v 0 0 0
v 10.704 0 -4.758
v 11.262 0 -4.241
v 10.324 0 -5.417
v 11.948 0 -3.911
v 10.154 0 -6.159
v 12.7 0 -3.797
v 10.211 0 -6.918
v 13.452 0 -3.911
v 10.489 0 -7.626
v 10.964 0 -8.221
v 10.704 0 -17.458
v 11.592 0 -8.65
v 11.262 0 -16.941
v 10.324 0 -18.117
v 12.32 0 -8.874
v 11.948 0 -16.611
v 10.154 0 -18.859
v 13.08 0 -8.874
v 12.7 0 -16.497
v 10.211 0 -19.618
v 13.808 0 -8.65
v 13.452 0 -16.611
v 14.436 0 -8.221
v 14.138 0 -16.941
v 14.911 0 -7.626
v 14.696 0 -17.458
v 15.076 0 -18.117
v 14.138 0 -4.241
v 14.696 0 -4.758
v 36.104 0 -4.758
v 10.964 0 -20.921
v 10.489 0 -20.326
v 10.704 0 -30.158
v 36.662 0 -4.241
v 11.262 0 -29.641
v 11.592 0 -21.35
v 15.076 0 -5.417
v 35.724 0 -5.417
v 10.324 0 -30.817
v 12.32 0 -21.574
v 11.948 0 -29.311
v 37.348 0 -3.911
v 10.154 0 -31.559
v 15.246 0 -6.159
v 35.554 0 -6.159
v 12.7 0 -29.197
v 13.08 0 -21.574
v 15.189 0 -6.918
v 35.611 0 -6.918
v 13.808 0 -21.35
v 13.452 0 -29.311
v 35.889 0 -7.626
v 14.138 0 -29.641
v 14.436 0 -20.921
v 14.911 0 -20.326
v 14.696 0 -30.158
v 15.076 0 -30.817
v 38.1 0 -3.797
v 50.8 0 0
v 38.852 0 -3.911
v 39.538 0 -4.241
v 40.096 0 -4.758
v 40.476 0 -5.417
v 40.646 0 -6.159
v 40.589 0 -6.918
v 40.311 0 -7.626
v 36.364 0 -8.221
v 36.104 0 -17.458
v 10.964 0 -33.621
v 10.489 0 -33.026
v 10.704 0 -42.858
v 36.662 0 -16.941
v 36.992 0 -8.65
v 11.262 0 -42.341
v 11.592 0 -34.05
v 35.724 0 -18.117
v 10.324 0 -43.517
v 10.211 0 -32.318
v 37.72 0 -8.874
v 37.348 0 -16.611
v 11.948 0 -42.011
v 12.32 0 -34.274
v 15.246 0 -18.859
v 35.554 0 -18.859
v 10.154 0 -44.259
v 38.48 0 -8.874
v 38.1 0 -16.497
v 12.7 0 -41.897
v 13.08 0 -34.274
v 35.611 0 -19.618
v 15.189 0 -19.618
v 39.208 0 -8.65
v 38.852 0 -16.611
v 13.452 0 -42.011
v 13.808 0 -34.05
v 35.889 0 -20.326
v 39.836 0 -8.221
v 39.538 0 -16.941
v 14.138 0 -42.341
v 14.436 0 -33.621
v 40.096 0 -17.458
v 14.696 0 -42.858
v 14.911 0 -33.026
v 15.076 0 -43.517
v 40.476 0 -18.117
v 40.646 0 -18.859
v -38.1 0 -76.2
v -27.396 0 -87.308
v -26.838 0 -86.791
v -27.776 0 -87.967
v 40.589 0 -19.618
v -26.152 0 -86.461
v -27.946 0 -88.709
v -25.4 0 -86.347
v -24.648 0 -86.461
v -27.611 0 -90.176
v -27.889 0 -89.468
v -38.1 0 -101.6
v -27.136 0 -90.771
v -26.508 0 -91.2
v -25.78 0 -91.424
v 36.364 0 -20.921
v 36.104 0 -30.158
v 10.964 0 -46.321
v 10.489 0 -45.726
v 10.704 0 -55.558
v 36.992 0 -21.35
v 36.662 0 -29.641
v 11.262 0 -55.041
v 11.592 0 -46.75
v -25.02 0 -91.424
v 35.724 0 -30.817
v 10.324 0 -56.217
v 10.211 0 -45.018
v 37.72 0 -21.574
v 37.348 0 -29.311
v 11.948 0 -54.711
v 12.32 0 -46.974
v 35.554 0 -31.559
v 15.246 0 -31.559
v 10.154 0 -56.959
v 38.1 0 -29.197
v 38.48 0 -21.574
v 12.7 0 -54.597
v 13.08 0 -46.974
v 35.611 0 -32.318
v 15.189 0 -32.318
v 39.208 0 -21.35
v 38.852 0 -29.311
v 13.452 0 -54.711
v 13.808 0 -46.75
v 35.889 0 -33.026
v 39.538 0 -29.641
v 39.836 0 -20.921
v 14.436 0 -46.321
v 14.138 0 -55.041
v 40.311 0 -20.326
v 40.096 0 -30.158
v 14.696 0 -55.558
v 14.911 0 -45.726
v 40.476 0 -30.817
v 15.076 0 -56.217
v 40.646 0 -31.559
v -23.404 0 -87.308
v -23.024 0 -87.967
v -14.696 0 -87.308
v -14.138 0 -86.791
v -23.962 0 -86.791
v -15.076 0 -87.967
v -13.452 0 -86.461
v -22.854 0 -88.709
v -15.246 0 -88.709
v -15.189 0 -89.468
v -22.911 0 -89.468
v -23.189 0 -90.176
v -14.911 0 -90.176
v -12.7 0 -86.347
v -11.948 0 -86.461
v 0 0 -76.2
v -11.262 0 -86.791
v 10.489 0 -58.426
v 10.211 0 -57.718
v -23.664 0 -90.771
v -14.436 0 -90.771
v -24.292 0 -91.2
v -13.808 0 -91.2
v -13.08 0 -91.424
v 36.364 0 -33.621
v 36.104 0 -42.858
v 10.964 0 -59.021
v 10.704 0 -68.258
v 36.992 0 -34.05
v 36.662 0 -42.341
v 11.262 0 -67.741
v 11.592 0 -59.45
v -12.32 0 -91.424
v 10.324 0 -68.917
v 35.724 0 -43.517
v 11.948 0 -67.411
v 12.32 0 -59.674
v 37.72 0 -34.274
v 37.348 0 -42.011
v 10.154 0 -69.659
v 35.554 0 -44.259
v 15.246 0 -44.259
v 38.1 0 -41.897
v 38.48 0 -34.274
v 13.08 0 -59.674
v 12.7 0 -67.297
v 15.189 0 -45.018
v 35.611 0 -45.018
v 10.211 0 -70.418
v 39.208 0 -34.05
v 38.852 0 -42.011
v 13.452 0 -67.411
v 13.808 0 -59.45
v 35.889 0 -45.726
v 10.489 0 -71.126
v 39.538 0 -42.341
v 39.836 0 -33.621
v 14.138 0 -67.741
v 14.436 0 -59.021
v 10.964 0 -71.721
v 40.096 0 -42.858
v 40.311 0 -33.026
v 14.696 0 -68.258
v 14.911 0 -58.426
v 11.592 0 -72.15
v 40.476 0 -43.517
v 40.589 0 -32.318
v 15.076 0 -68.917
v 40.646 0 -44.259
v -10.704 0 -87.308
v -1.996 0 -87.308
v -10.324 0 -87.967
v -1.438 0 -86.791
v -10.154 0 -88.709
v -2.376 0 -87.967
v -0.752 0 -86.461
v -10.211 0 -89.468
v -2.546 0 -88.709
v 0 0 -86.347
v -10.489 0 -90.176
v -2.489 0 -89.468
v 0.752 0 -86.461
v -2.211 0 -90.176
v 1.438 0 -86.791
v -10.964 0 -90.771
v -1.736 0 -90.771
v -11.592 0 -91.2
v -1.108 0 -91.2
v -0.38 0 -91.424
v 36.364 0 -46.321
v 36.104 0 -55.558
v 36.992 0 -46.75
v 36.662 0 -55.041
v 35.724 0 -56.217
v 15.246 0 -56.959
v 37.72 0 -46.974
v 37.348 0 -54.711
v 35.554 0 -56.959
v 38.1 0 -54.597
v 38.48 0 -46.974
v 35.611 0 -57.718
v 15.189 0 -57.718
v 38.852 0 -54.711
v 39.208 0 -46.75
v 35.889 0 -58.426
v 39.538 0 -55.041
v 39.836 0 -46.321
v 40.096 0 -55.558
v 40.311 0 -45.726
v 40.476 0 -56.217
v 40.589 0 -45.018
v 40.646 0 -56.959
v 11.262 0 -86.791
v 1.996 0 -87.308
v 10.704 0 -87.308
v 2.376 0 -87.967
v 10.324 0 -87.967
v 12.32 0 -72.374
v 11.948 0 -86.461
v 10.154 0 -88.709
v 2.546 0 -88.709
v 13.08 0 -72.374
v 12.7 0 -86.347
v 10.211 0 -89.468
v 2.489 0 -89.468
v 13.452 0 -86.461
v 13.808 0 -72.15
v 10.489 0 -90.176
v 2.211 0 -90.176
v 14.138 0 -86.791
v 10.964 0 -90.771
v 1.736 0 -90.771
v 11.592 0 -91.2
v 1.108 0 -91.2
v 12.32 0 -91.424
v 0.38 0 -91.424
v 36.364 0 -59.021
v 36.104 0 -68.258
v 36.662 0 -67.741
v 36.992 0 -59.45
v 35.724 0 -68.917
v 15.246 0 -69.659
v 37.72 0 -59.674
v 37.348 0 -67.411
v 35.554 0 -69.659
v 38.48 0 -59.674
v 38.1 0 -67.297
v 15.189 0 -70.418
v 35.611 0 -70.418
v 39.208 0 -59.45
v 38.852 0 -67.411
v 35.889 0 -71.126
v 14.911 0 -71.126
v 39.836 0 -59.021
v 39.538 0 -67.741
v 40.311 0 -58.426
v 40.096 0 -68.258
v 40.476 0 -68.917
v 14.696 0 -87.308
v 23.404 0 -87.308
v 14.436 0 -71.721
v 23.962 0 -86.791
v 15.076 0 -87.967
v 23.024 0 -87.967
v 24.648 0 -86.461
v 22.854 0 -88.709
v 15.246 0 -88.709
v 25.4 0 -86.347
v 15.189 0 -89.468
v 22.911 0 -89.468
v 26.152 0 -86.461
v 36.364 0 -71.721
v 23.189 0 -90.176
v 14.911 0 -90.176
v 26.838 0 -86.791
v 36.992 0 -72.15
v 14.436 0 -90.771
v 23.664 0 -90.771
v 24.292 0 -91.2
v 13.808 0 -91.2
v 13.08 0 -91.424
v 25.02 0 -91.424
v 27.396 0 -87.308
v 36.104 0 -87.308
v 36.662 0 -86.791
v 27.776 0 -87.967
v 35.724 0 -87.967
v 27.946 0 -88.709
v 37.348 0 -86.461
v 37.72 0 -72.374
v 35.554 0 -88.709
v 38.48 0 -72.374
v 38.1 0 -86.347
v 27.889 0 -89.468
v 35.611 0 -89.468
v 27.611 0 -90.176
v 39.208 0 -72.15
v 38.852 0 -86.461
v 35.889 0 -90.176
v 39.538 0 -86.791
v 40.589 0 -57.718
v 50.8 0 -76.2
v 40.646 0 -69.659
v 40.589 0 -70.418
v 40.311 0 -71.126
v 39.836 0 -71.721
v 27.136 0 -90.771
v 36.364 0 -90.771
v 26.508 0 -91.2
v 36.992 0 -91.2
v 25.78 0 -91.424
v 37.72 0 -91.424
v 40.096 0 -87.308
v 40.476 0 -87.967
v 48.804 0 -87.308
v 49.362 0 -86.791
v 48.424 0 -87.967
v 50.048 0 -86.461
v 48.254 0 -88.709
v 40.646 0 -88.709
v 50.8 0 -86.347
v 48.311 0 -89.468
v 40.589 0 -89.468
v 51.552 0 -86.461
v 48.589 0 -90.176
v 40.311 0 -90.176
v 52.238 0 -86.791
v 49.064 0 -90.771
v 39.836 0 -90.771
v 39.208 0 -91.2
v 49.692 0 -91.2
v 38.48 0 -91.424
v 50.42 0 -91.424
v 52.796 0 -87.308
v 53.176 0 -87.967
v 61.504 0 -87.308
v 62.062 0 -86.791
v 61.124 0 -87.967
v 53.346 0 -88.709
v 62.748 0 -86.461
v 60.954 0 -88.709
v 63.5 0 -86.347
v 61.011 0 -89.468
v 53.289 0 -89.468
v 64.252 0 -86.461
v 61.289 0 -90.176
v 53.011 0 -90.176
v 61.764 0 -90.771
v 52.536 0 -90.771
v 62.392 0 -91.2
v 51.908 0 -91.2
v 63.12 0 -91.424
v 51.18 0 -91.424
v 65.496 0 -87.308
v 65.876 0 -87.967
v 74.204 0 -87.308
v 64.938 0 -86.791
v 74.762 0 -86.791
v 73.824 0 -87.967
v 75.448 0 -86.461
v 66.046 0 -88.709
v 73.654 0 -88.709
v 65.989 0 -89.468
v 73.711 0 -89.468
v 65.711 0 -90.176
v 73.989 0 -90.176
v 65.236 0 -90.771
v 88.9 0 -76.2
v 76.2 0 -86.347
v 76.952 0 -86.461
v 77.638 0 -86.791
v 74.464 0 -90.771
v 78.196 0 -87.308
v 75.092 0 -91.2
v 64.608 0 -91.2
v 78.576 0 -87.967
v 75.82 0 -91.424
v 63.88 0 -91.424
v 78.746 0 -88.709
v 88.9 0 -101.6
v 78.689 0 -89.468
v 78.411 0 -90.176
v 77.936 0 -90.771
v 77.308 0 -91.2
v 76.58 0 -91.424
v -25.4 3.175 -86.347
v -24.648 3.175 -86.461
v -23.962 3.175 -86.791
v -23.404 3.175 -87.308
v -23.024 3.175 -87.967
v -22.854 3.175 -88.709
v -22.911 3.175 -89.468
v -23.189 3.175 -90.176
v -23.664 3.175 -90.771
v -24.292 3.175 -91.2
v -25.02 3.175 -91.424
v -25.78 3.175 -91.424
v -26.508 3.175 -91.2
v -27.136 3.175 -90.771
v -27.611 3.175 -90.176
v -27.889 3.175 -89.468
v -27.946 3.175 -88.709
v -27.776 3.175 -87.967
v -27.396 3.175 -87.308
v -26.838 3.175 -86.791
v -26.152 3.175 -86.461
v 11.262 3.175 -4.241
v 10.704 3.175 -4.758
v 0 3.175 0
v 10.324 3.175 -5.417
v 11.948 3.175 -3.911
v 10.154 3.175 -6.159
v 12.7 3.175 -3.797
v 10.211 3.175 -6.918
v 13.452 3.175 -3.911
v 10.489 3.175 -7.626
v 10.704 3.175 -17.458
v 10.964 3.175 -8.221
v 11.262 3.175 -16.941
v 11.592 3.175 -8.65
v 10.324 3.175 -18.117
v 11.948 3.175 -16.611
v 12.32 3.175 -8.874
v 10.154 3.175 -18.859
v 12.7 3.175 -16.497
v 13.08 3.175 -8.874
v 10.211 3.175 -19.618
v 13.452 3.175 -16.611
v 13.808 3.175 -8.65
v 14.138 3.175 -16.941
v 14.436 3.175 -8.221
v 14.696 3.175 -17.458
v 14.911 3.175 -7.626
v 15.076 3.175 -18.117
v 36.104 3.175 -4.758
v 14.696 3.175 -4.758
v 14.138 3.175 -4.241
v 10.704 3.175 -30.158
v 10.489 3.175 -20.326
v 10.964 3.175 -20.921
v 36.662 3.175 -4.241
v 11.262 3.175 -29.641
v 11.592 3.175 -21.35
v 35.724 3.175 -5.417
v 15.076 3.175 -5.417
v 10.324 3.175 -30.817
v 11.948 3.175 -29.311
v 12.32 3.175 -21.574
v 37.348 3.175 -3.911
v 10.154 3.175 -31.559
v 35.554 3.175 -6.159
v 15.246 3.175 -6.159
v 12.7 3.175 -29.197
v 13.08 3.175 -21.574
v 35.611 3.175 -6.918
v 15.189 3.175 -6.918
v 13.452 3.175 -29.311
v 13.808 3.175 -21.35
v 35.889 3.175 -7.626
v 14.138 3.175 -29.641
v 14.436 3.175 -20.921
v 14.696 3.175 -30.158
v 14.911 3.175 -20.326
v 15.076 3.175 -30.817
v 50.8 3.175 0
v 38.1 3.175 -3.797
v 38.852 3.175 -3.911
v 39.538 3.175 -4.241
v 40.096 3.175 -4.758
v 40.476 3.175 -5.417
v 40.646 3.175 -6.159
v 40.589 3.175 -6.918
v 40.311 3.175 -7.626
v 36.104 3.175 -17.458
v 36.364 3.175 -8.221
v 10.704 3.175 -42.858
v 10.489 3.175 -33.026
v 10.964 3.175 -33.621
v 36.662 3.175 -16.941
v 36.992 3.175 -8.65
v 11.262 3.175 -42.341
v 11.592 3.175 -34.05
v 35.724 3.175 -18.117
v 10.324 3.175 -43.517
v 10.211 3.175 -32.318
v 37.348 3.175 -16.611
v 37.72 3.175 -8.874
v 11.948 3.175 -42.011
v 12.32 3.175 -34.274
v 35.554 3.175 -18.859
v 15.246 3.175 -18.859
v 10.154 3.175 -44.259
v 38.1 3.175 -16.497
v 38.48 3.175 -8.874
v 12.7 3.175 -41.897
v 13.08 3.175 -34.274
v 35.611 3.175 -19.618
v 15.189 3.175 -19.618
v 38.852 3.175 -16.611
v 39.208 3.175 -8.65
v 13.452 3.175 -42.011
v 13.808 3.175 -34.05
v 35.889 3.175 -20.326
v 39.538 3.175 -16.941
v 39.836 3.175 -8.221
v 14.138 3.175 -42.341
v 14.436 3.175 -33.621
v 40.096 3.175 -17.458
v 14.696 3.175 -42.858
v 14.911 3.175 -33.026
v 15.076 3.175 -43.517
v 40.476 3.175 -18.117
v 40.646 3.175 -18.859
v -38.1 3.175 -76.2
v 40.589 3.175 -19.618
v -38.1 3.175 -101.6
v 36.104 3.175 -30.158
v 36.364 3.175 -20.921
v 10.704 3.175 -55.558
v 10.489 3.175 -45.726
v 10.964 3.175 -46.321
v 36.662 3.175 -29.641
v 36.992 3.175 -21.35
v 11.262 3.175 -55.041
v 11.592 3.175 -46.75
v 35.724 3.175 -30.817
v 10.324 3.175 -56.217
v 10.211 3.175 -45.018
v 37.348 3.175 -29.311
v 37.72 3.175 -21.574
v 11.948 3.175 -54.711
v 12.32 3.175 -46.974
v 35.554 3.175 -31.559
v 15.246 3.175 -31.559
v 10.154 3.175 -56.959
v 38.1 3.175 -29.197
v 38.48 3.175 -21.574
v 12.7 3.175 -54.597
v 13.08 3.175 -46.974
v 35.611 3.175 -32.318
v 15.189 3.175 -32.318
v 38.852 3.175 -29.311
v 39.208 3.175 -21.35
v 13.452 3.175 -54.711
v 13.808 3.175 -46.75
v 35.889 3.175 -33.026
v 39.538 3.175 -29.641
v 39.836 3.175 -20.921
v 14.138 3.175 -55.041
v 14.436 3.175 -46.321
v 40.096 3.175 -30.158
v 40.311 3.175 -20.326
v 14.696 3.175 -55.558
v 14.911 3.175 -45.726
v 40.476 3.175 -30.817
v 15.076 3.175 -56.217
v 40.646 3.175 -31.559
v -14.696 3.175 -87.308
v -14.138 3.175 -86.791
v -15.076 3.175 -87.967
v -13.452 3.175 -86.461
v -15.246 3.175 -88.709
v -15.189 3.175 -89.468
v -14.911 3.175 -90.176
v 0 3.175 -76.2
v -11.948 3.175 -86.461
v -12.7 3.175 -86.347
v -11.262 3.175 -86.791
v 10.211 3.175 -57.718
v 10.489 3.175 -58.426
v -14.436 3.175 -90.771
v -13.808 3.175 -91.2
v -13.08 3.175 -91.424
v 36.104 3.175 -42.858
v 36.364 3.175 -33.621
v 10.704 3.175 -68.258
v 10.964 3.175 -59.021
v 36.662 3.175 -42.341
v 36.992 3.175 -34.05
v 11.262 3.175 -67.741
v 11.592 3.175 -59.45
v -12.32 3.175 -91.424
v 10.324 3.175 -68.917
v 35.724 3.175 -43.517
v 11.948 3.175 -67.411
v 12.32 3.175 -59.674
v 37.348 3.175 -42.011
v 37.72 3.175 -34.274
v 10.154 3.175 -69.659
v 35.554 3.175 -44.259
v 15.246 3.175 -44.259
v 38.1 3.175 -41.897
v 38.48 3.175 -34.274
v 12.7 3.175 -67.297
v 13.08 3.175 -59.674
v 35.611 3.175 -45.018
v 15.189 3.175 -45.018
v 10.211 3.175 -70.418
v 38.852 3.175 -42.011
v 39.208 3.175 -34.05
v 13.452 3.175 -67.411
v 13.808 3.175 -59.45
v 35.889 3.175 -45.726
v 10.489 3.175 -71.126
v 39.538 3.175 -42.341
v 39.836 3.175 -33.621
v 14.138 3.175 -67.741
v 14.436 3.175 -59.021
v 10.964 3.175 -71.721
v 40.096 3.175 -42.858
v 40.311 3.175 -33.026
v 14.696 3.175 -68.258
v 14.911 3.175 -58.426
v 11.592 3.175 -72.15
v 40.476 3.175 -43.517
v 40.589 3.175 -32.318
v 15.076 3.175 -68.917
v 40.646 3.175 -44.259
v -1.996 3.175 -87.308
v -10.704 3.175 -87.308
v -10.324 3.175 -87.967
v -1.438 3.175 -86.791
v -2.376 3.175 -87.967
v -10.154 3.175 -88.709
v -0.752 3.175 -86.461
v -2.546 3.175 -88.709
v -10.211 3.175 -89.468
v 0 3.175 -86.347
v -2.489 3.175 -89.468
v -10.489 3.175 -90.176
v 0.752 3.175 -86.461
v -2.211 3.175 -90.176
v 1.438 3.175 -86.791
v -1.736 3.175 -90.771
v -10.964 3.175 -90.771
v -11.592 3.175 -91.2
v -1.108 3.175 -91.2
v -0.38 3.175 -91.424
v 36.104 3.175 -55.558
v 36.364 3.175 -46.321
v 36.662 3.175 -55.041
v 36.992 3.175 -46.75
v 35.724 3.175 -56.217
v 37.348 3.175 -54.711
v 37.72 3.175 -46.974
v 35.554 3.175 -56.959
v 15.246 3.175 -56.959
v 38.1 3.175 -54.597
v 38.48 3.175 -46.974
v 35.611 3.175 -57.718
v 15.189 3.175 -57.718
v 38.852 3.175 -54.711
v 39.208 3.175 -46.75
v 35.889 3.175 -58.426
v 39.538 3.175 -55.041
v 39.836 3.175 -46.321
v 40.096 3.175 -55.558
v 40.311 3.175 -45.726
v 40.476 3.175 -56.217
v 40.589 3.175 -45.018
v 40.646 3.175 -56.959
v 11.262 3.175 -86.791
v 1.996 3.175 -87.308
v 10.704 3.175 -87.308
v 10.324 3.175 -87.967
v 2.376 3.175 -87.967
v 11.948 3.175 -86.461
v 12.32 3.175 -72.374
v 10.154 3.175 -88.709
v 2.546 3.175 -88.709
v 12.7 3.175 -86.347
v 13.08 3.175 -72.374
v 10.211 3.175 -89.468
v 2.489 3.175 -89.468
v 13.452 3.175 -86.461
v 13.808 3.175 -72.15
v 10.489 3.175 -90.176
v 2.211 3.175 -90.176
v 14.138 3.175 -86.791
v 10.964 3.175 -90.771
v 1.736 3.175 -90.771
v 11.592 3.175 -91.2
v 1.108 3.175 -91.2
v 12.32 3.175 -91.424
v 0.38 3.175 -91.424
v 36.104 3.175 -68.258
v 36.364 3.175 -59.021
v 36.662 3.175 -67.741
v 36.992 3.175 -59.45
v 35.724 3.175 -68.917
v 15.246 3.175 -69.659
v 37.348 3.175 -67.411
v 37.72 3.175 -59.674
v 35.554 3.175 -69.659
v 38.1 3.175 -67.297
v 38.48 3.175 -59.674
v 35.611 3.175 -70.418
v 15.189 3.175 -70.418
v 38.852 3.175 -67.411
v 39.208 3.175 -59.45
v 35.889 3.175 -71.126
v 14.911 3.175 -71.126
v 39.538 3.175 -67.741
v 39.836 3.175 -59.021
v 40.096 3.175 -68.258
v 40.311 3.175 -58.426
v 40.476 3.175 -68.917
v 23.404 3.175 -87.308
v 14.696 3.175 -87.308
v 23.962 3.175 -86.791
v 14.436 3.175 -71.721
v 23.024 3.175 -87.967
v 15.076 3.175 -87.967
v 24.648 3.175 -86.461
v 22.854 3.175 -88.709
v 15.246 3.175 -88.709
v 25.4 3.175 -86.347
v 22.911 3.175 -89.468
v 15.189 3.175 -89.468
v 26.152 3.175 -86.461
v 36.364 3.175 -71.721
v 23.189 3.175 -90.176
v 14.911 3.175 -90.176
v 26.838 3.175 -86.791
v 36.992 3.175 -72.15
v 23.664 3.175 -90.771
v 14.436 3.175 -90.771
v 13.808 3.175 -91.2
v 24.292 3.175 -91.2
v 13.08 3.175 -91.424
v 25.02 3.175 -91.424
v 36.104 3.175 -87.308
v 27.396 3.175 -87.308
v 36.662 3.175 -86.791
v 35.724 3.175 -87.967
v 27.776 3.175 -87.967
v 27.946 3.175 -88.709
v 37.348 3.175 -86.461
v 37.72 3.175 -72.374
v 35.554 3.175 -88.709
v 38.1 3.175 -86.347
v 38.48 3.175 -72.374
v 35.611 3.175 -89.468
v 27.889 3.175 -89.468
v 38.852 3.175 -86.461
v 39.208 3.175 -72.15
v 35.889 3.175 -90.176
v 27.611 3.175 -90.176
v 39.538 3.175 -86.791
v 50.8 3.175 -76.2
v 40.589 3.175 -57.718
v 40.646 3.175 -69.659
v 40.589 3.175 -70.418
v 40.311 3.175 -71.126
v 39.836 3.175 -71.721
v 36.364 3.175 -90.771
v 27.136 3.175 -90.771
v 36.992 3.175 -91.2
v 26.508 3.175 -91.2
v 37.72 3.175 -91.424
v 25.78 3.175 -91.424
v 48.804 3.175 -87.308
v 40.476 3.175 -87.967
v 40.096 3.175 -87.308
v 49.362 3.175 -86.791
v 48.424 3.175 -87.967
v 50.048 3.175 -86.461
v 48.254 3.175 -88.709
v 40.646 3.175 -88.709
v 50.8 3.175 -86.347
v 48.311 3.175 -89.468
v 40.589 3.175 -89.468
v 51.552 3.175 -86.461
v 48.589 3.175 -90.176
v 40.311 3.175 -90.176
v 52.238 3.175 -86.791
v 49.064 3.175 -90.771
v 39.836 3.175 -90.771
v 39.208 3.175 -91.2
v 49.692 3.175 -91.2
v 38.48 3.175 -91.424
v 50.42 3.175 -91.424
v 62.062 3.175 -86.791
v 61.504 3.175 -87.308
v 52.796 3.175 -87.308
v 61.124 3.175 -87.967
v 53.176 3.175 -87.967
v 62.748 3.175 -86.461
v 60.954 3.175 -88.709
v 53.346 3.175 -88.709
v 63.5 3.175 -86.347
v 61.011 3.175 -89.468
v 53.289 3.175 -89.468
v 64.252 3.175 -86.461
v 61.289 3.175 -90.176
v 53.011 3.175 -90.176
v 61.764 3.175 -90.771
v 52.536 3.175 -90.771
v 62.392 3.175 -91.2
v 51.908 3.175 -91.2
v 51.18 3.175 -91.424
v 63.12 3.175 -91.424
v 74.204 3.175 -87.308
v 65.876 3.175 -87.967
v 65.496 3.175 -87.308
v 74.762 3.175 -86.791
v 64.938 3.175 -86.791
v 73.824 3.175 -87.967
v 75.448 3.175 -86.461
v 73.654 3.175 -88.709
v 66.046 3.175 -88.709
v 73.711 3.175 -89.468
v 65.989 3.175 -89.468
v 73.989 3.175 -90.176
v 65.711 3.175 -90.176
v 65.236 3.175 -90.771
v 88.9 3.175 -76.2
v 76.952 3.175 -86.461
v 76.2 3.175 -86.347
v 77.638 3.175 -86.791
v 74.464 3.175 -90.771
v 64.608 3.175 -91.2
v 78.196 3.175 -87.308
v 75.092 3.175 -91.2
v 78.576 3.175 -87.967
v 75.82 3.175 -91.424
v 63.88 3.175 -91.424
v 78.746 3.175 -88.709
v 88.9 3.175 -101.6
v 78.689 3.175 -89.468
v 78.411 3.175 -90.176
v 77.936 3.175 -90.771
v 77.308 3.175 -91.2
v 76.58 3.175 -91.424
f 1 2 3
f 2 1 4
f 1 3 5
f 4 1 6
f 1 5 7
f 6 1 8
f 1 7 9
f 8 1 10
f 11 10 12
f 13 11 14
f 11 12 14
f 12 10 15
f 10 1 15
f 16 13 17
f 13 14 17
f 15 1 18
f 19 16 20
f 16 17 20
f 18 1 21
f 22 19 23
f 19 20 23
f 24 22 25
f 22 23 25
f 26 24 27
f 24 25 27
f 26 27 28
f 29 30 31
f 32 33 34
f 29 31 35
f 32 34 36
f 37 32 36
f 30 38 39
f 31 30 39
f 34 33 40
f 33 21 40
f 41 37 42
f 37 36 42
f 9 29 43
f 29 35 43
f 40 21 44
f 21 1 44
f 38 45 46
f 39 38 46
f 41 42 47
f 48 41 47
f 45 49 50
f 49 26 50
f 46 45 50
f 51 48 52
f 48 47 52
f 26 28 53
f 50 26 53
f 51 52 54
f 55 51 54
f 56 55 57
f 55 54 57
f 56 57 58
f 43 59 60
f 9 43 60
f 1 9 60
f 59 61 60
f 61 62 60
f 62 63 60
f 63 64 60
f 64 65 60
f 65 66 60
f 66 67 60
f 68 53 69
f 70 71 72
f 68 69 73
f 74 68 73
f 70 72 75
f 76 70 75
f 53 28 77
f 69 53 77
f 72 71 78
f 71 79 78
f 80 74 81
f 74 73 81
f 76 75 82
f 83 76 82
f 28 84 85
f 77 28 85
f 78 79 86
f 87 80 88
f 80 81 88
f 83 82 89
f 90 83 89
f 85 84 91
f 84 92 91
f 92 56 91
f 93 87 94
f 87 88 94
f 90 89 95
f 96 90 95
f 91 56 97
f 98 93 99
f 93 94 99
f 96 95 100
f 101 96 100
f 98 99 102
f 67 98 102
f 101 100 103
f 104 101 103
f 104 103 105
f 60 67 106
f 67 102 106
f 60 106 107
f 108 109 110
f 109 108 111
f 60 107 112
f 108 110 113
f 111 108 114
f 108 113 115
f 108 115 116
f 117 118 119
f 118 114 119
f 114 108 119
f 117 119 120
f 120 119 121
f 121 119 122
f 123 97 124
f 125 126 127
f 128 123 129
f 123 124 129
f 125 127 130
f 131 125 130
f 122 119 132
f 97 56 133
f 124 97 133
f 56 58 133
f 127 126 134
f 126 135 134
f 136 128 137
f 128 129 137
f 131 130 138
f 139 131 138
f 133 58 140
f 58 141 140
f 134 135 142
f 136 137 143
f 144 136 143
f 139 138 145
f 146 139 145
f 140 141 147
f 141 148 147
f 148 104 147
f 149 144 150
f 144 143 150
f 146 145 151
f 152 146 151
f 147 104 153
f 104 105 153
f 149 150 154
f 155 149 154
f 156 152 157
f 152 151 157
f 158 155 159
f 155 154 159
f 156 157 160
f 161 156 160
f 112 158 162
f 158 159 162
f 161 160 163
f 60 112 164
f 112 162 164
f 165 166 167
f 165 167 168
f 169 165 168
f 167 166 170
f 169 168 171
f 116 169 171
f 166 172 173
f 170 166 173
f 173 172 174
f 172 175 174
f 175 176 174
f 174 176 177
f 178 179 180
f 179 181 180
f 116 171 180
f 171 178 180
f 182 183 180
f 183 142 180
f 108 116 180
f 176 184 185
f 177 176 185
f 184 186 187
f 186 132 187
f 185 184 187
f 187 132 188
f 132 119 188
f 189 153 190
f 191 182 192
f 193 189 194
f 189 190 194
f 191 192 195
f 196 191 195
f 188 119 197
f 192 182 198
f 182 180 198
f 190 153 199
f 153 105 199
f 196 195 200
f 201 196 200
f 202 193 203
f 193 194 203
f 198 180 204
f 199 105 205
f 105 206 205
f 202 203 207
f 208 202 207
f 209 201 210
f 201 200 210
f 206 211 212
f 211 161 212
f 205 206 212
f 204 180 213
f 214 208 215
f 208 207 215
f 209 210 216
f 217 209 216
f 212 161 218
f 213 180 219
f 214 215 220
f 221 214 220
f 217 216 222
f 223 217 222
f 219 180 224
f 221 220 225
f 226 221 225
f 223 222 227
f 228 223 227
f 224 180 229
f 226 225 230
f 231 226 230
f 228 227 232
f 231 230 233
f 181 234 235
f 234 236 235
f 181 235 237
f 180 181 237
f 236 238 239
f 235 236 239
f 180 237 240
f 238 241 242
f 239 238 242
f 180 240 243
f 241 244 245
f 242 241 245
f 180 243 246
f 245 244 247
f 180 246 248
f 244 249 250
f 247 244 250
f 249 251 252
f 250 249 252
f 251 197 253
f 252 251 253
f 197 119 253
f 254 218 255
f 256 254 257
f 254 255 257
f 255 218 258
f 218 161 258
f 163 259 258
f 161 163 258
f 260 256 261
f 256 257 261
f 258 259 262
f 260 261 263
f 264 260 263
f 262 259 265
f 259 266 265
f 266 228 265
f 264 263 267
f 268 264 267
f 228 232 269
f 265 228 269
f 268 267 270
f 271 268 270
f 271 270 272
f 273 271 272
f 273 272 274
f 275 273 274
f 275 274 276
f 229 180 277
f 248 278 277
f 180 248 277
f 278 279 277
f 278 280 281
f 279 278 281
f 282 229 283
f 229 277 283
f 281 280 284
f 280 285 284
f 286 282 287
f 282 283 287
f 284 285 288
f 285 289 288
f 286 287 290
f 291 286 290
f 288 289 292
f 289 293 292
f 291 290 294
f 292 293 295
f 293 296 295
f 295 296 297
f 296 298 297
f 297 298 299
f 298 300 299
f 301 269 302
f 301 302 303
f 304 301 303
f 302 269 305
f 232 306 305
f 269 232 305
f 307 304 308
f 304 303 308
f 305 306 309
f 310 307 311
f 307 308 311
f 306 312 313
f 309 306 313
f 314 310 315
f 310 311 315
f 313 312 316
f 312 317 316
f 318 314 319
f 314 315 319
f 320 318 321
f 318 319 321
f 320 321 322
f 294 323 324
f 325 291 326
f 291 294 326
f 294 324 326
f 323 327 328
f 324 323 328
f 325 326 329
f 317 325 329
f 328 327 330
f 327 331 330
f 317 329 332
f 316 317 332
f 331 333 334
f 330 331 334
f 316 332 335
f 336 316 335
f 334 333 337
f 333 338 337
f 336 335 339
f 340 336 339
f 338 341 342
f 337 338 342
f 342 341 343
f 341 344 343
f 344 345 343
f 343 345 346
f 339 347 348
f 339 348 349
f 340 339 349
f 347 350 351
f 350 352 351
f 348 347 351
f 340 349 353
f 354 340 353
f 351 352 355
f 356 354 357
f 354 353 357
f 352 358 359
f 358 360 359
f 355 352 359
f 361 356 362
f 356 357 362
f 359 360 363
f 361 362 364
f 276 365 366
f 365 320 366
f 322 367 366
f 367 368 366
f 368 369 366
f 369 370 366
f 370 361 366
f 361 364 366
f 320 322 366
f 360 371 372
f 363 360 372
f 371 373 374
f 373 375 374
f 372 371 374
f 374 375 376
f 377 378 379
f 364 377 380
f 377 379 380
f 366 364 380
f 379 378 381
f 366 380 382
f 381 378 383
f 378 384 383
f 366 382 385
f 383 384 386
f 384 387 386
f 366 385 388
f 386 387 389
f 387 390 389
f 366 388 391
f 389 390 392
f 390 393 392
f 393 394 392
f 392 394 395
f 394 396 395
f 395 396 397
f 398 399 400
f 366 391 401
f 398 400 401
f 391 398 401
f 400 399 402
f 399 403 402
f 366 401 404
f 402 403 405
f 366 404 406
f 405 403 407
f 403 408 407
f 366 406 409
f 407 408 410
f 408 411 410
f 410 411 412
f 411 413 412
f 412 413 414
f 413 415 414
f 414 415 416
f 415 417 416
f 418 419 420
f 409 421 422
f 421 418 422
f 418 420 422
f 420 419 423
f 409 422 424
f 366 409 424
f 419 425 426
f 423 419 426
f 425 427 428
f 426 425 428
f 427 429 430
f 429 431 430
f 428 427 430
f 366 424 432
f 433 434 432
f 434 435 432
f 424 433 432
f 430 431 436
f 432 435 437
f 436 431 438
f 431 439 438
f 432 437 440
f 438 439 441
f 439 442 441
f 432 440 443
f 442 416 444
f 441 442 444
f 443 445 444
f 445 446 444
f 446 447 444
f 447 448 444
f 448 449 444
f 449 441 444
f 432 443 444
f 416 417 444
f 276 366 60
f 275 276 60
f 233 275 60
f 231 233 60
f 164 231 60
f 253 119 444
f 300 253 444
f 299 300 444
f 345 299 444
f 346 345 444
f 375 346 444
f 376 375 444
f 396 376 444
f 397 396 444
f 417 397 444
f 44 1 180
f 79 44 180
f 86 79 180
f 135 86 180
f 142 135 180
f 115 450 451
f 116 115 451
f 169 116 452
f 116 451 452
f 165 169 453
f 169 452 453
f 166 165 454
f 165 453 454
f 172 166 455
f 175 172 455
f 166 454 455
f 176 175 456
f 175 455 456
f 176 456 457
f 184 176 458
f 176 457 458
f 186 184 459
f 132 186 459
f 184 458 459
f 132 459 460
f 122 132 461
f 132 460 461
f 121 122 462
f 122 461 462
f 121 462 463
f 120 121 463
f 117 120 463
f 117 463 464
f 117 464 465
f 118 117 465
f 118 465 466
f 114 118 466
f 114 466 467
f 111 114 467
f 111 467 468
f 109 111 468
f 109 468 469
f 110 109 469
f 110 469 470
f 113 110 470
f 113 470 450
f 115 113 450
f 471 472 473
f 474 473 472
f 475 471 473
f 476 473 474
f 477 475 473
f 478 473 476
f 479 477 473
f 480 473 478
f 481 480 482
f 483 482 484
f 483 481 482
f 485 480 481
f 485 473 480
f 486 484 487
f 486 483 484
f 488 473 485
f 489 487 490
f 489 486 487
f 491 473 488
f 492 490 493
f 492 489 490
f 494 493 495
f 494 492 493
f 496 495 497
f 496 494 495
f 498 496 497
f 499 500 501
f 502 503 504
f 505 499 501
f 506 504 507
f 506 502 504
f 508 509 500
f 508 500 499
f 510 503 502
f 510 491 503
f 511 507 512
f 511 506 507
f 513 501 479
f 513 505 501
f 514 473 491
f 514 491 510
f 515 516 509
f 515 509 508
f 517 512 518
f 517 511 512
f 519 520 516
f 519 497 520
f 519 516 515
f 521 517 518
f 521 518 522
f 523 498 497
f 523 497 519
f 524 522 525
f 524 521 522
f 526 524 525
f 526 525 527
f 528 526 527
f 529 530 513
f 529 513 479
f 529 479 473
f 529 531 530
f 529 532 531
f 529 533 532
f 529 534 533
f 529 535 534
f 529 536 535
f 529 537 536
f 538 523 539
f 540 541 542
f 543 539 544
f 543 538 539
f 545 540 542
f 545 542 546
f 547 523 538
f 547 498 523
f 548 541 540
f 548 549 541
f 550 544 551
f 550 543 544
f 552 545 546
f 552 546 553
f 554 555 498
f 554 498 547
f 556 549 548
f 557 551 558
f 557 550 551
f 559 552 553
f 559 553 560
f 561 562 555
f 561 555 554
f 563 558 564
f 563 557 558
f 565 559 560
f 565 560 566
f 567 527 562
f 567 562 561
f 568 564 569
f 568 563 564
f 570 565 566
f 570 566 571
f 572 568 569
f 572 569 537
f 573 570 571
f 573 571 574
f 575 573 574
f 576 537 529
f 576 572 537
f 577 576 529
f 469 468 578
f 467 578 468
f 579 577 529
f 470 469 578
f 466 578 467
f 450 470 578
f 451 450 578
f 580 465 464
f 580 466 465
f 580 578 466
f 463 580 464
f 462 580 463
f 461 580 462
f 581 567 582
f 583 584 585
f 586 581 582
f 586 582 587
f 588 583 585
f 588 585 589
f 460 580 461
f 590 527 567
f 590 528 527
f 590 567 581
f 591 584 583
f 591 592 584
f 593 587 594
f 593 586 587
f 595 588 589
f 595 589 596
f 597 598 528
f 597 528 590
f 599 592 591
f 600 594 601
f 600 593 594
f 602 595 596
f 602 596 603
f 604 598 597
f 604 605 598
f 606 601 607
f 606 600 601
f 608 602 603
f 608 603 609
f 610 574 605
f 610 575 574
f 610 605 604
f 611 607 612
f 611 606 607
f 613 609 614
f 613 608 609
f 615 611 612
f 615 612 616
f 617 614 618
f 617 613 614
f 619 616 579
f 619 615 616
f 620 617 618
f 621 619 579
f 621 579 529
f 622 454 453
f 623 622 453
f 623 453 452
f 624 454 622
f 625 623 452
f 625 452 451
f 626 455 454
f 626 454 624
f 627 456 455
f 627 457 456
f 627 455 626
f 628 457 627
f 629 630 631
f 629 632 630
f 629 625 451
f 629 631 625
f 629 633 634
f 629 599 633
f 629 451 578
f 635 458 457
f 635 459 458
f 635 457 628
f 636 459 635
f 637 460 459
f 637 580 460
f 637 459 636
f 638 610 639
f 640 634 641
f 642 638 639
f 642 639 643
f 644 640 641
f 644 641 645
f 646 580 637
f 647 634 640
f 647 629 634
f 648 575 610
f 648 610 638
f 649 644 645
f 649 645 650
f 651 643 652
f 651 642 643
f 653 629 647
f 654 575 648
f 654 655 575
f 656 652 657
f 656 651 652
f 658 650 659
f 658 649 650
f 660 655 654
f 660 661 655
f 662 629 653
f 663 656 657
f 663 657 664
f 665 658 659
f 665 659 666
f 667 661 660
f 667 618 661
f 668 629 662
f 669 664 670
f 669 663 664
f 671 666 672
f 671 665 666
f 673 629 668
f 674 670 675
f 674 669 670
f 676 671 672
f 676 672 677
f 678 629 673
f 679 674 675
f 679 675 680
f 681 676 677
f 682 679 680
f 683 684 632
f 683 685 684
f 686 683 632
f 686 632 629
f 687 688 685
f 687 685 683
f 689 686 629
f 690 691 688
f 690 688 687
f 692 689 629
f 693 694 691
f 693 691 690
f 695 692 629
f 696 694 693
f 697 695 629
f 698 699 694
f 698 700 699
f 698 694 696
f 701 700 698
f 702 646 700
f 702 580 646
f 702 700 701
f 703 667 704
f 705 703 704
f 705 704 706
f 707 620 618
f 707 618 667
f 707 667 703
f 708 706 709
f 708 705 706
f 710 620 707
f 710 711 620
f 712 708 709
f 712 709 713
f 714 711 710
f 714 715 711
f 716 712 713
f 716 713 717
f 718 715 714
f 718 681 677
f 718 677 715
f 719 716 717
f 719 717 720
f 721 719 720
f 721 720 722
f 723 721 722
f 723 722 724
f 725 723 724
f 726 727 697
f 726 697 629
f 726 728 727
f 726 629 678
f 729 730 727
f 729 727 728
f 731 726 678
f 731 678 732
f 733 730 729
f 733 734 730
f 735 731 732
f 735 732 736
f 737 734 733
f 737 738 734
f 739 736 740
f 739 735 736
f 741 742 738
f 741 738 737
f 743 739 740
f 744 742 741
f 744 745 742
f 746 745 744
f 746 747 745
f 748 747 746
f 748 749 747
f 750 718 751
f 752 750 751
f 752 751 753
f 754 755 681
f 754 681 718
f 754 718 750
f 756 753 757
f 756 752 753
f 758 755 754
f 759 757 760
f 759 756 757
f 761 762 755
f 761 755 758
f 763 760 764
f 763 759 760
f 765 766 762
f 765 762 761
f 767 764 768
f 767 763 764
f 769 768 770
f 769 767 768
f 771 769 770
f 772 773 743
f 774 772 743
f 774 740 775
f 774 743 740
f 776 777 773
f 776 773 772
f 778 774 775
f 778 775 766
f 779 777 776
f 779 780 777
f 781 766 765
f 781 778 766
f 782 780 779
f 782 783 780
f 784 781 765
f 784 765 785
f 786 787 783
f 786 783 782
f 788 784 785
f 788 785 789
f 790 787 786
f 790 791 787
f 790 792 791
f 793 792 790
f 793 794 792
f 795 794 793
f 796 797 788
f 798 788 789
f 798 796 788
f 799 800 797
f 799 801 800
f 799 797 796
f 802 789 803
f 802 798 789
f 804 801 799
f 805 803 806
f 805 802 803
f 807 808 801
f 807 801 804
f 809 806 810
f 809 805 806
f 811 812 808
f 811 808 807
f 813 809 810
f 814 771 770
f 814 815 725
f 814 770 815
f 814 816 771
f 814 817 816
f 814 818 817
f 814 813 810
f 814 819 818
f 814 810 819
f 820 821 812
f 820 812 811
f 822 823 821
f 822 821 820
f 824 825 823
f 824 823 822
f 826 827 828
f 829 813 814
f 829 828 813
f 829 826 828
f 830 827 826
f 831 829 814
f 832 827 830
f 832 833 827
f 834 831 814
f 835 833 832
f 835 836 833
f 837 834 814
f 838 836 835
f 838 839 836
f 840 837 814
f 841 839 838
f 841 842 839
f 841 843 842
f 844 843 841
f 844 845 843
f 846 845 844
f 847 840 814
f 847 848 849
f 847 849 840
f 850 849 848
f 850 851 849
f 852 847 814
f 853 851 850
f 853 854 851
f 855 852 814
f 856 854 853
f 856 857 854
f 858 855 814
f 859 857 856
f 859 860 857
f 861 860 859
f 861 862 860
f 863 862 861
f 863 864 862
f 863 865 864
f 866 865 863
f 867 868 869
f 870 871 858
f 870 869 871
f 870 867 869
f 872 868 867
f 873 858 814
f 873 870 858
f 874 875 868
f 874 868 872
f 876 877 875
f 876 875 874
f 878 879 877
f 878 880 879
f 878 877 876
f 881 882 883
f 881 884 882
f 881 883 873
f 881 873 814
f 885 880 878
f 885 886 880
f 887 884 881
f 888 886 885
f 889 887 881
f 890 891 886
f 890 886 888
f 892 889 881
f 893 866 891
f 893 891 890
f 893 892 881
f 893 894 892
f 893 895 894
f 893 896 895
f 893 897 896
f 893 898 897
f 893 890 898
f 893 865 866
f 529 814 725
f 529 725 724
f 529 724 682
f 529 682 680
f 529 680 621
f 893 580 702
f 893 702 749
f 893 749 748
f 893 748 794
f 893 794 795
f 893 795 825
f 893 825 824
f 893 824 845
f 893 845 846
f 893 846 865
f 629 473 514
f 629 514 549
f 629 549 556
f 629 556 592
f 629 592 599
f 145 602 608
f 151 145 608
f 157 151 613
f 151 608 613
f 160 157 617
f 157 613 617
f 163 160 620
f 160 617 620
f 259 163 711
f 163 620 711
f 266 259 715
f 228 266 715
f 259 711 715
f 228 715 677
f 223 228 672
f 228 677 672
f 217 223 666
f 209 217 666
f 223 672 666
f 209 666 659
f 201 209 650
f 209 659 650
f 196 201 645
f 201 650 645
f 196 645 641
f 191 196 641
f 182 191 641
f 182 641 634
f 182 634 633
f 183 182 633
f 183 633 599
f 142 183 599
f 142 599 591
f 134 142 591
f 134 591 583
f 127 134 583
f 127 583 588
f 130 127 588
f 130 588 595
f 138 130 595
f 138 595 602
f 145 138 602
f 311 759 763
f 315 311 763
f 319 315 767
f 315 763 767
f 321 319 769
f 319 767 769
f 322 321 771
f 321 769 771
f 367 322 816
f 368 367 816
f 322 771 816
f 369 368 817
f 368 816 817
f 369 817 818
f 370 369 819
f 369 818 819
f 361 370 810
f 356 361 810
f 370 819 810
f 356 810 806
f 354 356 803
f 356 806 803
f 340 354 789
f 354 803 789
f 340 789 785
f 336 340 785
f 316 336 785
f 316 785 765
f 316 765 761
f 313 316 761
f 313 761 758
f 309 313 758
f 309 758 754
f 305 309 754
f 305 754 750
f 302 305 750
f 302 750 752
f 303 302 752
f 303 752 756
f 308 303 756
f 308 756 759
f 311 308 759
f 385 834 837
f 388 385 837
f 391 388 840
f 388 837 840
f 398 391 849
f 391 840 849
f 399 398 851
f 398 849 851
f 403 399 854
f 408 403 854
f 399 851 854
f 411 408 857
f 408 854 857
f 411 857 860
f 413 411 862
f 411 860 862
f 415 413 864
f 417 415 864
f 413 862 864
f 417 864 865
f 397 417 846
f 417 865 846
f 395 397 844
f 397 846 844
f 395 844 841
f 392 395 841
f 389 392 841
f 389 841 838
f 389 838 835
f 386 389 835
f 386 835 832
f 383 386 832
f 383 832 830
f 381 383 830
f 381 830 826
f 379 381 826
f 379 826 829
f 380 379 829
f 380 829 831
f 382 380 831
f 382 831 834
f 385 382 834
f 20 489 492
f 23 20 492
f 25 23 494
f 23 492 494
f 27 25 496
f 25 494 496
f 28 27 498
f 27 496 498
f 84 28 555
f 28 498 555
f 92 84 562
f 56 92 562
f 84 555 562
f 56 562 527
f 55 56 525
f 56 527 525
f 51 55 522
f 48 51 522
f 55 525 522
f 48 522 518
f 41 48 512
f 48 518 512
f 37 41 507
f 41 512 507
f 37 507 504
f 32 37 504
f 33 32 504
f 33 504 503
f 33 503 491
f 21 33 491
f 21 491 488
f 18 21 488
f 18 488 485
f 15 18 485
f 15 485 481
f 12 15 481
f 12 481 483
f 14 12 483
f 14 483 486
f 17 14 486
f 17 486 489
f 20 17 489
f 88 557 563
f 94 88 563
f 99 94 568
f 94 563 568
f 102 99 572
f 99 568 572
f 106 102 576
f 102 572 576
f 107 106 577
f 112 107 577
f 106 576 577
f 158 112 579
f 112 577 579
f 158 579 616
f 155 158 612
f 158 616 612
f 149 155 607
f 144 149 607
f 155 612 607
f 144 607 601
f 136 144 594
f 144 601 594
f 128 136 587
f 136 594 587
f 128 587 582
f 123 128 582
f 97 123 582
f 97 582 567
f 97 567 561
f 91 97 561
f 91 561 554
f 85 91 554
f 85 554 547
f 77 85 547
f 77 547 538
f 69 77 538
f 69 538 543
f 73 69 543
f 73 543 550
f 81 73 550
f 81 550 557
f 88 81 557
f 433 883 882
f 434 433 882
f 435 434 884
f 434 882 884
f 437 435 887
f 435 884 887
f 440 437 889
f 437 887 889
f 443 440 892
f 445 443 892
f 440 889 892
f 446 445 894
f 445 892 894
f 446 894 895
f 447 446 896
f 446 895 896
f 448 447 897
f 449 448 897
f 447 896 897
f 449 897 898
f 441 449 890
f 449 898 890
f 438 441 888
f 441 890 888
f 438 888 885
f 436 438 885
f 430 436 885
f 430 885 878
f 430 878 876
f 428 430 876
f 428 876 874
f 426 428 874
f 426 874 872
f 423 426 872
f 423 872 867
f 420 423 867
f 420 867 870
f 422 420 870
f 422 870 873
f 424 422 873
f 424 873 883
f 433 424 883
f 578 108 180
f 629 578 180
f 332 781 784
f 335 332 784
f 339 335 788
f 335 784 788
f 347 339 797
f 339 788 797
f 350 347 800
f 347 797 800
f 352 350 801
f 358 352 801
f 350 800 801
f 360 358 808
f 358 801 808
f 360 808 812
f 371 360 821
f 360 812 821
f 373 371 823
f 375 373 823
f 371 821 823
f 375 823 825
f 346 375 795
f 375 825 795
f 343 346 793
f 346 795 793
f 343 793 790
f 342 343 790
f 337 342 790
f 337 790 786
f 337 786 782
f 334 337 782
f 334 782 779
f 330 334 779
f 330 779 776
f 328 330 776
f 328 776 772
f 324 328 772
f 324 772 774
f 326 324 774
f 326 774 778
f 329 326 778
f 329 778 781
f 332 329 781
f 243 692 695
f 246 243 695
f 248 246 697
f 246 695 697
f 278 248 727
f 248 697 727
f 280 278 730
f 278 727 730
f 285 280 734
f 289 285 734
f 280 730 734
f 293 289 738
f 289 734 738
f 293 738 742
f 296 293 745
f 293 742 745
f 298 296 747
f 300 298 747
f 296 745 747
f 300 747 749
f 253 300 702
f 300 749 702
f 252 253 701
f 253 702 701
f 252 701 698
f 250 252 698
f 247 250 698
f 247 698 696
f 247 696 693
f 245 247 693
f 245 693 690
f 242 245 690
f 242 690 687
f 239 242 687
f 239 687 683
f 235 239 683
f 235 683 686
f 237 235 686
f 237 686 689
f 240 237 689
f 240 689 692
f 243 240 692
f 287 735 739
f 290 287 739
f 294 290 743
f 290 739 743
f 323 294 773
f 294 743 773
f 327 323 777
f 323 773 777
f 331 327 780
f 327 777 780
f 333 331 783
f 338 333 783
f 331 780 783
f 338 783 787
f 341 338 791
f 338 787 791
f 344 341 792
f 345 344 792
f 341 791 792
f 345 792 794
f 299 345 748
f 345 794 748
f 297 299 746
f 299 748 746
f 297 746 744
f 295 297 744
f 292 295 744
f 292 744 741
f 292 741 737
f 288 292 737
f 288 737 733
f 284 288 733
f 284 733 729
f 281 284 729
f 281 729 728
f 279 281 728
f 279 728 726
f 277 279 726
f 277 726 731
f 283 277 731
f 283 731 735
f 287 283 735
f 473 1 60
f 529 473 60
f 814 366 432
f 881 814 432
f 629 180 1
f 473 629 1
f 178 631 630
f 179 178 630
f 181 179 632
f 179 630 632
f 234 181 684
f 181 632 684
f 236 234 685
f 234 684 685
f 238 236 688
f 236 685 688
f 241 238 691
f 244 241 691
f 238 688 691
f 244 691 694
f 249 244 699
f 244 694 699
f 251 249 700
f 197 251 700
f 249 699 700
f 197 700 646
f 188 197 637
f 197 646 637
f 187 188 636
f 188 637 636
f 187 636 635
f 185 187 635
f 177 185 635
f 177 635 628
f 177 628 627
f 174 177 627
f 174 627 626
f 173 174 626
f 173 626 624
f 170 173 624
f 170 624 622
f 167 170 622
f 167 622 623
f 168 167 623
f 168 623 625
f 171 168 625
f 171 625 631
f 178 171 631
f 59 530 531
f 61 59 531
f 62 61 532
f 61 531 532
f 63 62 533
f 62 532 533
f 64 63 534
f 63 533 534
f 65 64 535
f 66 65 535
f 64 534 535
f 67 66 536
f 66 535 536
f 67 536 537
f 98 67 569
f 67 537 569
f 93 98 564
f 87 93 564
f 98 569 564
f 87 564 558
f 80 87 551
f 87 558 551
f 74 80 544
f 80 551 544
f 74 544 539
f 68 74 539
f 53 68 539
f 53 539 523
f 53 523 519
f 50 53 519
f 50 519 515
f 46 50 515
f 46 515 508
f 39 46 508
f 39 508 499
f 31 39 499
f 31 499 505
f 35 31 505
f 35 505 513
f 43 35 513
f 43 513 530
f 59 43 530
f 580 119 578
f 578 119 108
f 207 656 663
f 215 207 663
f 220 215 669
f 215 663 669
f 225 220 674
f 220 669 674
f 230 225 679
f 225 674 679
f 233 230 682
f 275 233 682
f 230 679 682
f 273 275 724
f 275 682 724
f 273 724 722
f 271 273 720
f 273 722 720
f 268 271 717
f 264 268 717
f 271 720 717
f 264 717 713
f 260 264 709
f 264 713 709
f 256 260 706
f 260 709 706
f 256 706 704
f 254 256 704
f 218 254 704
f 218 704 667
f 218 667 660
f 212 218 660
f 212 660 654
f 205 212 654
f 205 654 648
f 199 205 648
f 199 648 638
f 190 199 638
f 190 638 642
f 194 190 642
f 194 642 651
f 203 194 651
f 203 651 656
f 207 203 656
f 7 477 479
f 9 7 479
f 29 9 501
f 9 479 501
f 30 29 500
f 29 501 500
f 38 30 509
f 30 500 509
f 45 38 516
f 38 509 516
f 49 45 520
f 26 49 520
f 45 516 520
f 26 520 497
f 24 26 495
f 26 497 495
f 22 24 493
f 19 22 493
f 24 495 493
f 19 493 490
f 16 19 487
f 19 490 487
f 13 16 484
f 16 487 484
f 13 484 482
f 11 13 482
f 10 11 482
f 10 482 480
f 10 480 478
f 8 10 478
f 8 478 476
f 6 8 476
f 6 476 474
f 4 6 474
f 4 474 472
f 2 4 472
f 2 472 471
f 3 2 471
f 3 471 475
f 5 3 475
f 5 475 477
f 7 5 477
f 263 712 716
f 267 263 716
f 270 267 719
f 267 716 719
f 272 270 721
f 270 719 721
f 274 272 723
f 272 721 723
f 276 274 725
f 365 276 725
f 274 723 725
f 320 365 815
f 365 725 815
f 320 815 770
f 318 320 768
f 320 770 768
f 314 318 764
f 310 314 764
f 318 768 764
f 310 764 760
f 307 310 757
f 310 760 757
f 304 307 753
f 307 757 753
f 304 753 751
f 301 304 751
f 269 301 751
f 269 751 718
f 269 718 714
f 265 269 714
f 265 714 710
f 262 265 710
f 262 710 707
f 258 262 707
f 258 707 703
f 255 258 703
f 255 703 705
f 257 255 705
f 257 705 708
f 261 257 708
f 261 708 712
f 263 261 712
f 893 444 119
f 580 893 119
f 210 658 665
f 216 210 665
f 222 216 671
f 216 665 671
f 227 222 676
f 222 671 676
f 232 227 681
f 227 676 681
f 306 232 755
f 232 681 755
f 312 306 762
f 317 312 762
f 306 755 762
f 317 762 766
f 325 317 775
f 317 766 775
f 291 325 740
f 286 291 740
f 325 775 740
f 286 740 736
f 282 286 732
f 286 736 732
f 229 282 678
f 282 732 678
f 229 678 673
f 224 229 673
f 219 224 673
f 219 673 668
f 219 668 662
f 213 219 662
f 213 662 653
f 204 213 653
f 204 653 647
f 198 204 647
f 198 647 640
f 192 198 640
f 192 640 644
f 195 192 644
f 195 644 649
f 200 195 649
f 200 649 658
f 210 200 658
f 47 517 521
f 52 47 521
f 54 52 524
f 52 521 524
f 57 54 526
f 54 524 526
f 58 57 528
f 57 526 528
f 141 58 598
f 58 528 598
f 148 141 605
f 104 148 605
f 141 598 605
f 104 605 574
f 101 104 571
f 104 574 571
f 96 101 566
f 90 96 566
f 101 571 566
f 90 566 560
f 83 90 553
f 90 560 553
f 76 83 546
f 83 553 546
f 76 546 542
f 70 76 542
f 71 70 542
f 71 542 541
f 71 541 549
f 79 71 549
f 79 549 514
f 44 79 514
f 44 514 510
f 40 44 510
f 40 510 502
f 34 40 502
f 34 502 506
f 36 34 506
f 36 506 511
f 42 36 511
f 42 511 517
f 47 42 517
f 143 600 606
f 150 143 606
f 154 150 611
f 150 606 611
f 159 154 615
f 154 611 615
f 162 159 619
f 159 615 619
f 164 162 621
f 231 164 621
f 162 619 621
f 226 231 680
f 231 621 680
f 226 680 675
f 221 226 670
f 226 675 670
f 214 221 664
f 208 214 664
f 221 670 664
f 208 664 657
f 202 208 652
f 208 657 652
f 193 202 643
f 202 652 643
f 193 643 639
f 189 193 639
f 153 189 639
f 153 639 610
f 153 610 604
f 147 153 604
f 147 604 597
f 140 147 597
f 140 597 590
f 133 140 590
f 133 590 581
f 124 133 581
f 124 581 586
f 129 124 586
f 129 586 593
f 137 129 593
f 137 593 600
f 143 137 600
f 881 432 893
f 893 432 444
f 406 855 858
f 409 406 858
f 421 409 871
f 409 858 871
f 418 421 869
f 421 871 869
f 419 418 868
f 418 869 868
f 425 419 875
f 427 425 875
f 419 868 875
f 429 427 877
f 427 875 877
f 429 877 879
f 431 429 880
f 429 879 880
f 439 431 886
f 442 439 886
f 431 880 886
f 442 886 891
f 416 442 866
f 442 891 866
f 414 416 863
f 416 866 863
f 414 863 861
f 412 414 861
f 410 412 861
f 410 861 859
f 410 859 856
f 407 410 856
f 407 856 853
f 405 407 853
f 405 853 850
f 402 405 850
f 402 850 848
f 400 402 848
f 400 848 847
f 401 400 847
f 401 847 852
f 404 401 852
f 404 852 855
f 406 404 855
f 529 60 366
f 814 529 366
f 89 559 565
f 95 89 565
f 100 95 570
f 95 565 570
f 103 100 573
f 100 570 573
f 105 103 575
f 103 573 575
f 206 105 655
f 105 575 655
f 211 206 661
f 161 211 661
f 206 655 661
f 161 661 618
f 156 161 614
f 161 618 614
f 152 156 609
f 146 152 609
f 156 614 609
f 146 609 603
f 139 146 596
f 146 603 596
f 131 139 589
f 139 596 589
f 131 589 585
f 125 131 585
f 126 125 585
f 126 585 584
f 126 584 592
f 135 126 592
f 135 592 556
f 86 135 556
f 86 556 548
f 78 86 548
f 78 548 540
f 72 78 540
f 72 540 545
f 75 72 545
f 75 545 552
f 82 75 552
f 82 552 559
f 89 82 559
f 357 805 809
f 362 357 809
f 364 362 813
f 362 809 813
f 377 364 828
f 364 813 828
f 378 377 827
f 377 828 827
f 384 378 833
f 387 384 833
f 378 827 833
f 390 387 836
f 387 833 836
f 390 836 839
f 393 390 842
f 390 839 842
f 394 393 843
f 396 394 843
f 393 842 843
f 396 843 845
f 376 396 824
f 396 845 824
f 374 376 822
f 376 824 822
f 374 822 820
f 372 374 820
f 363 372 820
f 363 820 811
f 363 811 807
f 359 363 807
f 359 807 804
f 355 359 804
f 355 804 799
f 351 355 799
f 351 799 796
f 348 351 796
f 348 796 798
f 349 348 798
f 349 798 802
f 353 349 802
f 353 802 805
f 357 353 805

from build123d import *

# Parameters (mm, degrees)
BOSS_EXTRUDE1_DEPTH = 3.175
SKETCH2_R           = 2.5527
CUT_EXTRUDE1_DEPTH  = 136.04018152
SKETCH3_R           = 2.5527
CUT_EXTRUDE2_DEPTH  = 136.04018152


with BuildPart() as part:
    # Sketch1 → Boss-Extrude1 (new body)
    with BuildSketch(Plane(origin=(0, 0, 0), x_dir=(1, 0, 0), z_dir=(0, 1, 0))):
        Polygon((0, 0), (50.8, 0), (50.8, 76.2), (88.9, 76.2), (88.9, 101.6), (-38.1, 101.6), (-38.1, 76.2), (0, 76.2), align=None)
    extrude(amount=BOSS_EXTRUDE1_DEPTH)

    # Sketch2 → Cut-Extrude1 (cut, through all)
    with BuildSketch(Plane(origin=(0, 3.175, 0), x_dir=(1, 0, 0), z_dir=(0, 1, 0))):
        with Locations(Location((38.1, 6.35, 0), (0, 0, 270))):
            Circle(SKETCH2_R)
        with Locations(Location((12.7, 6.35, 0), (0, 0, 270))):
            Circle(SKETCH2_R)
        with Locations(Location((38.1, 19.05, 0), (0, 0, 270))):
            Circle(SKETCH2_R)
        with Locations(Location((12.7, 19.05, 0), (0, 0, 270))):
            Circle(SKETCH2_R)
        with Locations(Location((38.1, 31.75, 0), (0, 0, 270))):
            Circle(SKETCH2_R)
        with Locations(Location((12.7, 31.75, 0), (0, 0, 270))):
            Circle(SKETCH2_R)
        with Locations(Location((38.1, 44.45, 0), (0, 0, 270))):
            Circle(SKETCH2_R)
        with Locations(Location((12.7, 44.45, 0), (0, 0, 270))):
            Circle(SKETCH2_R)
        with Locations(Location((38.1, 57.15, 0), (0, 0, 270))):
            Circle(SKETCH2_R)
        with Locations(Location((12.7, 57.15, 0), (0, 0, 270))):
            Circle(SKETCH2_R)
        with Locations(Location((38.1, 69.85, 0), (0, 0, 270))):
            Circle(SKETCH2_R)
        with Locations(Location((12.7, 69.85, 0), (0, 0, 270))):
            Circle(SKETCH2_R)
    extrude(amount=-CUT_EXTRUDE1_DEPTH, mode=Mode.SUBTRACT)

    # Sketch3 → Cut-Extrude2 (cut, through all)
    with BuildSketch(Plane(origin=(0, 3.175, 0), x_dir=(1, 0, 0), z_dir=(0, 1, 0))):
        with Locations(Location((76.2, 88.9, 0), (0, 0, 270))):
            Circle(SKETCH3_R)
        with Locations(Location((63.5, 88.9, 0), (0, 0, 270))):
            Circle(SKETCH3_R)
        with Locations(Location((50.8, 88.9, 0), (0, 0, 270))):
            Circle(SKETCH3_R)
        with Locations(Location((38.1, 88.9, 0), (0, 0, 270))):
            Circle(SKETCH3_R)
        with Locations(Location((25.4, 88.9, 0), (0, 0, 270))):
            Circle(SKETCH3_R)
        with Locations(Location((12.7, 88.9, 0), (0, 0, 270))):
            Circle(SKETCH3_R)
        with Locations(Location((0, 88.9, 0), (0, 0, 270))):
            Circle(SKETCH3_R)
        with Locations(Location((-12.7, 88.9, 0), (0, 0, 270))):
            Circle(SKETCH3_R)
        with Locations(Location((-25.4, 88.9, 0), (0, 0, 270))):
            Circle(SKETCH3_R)
    extrude(amount=-CUT_EXTRUDE2_DEPTH, mode=Mode.SUBTRACT)


solid = part.part
